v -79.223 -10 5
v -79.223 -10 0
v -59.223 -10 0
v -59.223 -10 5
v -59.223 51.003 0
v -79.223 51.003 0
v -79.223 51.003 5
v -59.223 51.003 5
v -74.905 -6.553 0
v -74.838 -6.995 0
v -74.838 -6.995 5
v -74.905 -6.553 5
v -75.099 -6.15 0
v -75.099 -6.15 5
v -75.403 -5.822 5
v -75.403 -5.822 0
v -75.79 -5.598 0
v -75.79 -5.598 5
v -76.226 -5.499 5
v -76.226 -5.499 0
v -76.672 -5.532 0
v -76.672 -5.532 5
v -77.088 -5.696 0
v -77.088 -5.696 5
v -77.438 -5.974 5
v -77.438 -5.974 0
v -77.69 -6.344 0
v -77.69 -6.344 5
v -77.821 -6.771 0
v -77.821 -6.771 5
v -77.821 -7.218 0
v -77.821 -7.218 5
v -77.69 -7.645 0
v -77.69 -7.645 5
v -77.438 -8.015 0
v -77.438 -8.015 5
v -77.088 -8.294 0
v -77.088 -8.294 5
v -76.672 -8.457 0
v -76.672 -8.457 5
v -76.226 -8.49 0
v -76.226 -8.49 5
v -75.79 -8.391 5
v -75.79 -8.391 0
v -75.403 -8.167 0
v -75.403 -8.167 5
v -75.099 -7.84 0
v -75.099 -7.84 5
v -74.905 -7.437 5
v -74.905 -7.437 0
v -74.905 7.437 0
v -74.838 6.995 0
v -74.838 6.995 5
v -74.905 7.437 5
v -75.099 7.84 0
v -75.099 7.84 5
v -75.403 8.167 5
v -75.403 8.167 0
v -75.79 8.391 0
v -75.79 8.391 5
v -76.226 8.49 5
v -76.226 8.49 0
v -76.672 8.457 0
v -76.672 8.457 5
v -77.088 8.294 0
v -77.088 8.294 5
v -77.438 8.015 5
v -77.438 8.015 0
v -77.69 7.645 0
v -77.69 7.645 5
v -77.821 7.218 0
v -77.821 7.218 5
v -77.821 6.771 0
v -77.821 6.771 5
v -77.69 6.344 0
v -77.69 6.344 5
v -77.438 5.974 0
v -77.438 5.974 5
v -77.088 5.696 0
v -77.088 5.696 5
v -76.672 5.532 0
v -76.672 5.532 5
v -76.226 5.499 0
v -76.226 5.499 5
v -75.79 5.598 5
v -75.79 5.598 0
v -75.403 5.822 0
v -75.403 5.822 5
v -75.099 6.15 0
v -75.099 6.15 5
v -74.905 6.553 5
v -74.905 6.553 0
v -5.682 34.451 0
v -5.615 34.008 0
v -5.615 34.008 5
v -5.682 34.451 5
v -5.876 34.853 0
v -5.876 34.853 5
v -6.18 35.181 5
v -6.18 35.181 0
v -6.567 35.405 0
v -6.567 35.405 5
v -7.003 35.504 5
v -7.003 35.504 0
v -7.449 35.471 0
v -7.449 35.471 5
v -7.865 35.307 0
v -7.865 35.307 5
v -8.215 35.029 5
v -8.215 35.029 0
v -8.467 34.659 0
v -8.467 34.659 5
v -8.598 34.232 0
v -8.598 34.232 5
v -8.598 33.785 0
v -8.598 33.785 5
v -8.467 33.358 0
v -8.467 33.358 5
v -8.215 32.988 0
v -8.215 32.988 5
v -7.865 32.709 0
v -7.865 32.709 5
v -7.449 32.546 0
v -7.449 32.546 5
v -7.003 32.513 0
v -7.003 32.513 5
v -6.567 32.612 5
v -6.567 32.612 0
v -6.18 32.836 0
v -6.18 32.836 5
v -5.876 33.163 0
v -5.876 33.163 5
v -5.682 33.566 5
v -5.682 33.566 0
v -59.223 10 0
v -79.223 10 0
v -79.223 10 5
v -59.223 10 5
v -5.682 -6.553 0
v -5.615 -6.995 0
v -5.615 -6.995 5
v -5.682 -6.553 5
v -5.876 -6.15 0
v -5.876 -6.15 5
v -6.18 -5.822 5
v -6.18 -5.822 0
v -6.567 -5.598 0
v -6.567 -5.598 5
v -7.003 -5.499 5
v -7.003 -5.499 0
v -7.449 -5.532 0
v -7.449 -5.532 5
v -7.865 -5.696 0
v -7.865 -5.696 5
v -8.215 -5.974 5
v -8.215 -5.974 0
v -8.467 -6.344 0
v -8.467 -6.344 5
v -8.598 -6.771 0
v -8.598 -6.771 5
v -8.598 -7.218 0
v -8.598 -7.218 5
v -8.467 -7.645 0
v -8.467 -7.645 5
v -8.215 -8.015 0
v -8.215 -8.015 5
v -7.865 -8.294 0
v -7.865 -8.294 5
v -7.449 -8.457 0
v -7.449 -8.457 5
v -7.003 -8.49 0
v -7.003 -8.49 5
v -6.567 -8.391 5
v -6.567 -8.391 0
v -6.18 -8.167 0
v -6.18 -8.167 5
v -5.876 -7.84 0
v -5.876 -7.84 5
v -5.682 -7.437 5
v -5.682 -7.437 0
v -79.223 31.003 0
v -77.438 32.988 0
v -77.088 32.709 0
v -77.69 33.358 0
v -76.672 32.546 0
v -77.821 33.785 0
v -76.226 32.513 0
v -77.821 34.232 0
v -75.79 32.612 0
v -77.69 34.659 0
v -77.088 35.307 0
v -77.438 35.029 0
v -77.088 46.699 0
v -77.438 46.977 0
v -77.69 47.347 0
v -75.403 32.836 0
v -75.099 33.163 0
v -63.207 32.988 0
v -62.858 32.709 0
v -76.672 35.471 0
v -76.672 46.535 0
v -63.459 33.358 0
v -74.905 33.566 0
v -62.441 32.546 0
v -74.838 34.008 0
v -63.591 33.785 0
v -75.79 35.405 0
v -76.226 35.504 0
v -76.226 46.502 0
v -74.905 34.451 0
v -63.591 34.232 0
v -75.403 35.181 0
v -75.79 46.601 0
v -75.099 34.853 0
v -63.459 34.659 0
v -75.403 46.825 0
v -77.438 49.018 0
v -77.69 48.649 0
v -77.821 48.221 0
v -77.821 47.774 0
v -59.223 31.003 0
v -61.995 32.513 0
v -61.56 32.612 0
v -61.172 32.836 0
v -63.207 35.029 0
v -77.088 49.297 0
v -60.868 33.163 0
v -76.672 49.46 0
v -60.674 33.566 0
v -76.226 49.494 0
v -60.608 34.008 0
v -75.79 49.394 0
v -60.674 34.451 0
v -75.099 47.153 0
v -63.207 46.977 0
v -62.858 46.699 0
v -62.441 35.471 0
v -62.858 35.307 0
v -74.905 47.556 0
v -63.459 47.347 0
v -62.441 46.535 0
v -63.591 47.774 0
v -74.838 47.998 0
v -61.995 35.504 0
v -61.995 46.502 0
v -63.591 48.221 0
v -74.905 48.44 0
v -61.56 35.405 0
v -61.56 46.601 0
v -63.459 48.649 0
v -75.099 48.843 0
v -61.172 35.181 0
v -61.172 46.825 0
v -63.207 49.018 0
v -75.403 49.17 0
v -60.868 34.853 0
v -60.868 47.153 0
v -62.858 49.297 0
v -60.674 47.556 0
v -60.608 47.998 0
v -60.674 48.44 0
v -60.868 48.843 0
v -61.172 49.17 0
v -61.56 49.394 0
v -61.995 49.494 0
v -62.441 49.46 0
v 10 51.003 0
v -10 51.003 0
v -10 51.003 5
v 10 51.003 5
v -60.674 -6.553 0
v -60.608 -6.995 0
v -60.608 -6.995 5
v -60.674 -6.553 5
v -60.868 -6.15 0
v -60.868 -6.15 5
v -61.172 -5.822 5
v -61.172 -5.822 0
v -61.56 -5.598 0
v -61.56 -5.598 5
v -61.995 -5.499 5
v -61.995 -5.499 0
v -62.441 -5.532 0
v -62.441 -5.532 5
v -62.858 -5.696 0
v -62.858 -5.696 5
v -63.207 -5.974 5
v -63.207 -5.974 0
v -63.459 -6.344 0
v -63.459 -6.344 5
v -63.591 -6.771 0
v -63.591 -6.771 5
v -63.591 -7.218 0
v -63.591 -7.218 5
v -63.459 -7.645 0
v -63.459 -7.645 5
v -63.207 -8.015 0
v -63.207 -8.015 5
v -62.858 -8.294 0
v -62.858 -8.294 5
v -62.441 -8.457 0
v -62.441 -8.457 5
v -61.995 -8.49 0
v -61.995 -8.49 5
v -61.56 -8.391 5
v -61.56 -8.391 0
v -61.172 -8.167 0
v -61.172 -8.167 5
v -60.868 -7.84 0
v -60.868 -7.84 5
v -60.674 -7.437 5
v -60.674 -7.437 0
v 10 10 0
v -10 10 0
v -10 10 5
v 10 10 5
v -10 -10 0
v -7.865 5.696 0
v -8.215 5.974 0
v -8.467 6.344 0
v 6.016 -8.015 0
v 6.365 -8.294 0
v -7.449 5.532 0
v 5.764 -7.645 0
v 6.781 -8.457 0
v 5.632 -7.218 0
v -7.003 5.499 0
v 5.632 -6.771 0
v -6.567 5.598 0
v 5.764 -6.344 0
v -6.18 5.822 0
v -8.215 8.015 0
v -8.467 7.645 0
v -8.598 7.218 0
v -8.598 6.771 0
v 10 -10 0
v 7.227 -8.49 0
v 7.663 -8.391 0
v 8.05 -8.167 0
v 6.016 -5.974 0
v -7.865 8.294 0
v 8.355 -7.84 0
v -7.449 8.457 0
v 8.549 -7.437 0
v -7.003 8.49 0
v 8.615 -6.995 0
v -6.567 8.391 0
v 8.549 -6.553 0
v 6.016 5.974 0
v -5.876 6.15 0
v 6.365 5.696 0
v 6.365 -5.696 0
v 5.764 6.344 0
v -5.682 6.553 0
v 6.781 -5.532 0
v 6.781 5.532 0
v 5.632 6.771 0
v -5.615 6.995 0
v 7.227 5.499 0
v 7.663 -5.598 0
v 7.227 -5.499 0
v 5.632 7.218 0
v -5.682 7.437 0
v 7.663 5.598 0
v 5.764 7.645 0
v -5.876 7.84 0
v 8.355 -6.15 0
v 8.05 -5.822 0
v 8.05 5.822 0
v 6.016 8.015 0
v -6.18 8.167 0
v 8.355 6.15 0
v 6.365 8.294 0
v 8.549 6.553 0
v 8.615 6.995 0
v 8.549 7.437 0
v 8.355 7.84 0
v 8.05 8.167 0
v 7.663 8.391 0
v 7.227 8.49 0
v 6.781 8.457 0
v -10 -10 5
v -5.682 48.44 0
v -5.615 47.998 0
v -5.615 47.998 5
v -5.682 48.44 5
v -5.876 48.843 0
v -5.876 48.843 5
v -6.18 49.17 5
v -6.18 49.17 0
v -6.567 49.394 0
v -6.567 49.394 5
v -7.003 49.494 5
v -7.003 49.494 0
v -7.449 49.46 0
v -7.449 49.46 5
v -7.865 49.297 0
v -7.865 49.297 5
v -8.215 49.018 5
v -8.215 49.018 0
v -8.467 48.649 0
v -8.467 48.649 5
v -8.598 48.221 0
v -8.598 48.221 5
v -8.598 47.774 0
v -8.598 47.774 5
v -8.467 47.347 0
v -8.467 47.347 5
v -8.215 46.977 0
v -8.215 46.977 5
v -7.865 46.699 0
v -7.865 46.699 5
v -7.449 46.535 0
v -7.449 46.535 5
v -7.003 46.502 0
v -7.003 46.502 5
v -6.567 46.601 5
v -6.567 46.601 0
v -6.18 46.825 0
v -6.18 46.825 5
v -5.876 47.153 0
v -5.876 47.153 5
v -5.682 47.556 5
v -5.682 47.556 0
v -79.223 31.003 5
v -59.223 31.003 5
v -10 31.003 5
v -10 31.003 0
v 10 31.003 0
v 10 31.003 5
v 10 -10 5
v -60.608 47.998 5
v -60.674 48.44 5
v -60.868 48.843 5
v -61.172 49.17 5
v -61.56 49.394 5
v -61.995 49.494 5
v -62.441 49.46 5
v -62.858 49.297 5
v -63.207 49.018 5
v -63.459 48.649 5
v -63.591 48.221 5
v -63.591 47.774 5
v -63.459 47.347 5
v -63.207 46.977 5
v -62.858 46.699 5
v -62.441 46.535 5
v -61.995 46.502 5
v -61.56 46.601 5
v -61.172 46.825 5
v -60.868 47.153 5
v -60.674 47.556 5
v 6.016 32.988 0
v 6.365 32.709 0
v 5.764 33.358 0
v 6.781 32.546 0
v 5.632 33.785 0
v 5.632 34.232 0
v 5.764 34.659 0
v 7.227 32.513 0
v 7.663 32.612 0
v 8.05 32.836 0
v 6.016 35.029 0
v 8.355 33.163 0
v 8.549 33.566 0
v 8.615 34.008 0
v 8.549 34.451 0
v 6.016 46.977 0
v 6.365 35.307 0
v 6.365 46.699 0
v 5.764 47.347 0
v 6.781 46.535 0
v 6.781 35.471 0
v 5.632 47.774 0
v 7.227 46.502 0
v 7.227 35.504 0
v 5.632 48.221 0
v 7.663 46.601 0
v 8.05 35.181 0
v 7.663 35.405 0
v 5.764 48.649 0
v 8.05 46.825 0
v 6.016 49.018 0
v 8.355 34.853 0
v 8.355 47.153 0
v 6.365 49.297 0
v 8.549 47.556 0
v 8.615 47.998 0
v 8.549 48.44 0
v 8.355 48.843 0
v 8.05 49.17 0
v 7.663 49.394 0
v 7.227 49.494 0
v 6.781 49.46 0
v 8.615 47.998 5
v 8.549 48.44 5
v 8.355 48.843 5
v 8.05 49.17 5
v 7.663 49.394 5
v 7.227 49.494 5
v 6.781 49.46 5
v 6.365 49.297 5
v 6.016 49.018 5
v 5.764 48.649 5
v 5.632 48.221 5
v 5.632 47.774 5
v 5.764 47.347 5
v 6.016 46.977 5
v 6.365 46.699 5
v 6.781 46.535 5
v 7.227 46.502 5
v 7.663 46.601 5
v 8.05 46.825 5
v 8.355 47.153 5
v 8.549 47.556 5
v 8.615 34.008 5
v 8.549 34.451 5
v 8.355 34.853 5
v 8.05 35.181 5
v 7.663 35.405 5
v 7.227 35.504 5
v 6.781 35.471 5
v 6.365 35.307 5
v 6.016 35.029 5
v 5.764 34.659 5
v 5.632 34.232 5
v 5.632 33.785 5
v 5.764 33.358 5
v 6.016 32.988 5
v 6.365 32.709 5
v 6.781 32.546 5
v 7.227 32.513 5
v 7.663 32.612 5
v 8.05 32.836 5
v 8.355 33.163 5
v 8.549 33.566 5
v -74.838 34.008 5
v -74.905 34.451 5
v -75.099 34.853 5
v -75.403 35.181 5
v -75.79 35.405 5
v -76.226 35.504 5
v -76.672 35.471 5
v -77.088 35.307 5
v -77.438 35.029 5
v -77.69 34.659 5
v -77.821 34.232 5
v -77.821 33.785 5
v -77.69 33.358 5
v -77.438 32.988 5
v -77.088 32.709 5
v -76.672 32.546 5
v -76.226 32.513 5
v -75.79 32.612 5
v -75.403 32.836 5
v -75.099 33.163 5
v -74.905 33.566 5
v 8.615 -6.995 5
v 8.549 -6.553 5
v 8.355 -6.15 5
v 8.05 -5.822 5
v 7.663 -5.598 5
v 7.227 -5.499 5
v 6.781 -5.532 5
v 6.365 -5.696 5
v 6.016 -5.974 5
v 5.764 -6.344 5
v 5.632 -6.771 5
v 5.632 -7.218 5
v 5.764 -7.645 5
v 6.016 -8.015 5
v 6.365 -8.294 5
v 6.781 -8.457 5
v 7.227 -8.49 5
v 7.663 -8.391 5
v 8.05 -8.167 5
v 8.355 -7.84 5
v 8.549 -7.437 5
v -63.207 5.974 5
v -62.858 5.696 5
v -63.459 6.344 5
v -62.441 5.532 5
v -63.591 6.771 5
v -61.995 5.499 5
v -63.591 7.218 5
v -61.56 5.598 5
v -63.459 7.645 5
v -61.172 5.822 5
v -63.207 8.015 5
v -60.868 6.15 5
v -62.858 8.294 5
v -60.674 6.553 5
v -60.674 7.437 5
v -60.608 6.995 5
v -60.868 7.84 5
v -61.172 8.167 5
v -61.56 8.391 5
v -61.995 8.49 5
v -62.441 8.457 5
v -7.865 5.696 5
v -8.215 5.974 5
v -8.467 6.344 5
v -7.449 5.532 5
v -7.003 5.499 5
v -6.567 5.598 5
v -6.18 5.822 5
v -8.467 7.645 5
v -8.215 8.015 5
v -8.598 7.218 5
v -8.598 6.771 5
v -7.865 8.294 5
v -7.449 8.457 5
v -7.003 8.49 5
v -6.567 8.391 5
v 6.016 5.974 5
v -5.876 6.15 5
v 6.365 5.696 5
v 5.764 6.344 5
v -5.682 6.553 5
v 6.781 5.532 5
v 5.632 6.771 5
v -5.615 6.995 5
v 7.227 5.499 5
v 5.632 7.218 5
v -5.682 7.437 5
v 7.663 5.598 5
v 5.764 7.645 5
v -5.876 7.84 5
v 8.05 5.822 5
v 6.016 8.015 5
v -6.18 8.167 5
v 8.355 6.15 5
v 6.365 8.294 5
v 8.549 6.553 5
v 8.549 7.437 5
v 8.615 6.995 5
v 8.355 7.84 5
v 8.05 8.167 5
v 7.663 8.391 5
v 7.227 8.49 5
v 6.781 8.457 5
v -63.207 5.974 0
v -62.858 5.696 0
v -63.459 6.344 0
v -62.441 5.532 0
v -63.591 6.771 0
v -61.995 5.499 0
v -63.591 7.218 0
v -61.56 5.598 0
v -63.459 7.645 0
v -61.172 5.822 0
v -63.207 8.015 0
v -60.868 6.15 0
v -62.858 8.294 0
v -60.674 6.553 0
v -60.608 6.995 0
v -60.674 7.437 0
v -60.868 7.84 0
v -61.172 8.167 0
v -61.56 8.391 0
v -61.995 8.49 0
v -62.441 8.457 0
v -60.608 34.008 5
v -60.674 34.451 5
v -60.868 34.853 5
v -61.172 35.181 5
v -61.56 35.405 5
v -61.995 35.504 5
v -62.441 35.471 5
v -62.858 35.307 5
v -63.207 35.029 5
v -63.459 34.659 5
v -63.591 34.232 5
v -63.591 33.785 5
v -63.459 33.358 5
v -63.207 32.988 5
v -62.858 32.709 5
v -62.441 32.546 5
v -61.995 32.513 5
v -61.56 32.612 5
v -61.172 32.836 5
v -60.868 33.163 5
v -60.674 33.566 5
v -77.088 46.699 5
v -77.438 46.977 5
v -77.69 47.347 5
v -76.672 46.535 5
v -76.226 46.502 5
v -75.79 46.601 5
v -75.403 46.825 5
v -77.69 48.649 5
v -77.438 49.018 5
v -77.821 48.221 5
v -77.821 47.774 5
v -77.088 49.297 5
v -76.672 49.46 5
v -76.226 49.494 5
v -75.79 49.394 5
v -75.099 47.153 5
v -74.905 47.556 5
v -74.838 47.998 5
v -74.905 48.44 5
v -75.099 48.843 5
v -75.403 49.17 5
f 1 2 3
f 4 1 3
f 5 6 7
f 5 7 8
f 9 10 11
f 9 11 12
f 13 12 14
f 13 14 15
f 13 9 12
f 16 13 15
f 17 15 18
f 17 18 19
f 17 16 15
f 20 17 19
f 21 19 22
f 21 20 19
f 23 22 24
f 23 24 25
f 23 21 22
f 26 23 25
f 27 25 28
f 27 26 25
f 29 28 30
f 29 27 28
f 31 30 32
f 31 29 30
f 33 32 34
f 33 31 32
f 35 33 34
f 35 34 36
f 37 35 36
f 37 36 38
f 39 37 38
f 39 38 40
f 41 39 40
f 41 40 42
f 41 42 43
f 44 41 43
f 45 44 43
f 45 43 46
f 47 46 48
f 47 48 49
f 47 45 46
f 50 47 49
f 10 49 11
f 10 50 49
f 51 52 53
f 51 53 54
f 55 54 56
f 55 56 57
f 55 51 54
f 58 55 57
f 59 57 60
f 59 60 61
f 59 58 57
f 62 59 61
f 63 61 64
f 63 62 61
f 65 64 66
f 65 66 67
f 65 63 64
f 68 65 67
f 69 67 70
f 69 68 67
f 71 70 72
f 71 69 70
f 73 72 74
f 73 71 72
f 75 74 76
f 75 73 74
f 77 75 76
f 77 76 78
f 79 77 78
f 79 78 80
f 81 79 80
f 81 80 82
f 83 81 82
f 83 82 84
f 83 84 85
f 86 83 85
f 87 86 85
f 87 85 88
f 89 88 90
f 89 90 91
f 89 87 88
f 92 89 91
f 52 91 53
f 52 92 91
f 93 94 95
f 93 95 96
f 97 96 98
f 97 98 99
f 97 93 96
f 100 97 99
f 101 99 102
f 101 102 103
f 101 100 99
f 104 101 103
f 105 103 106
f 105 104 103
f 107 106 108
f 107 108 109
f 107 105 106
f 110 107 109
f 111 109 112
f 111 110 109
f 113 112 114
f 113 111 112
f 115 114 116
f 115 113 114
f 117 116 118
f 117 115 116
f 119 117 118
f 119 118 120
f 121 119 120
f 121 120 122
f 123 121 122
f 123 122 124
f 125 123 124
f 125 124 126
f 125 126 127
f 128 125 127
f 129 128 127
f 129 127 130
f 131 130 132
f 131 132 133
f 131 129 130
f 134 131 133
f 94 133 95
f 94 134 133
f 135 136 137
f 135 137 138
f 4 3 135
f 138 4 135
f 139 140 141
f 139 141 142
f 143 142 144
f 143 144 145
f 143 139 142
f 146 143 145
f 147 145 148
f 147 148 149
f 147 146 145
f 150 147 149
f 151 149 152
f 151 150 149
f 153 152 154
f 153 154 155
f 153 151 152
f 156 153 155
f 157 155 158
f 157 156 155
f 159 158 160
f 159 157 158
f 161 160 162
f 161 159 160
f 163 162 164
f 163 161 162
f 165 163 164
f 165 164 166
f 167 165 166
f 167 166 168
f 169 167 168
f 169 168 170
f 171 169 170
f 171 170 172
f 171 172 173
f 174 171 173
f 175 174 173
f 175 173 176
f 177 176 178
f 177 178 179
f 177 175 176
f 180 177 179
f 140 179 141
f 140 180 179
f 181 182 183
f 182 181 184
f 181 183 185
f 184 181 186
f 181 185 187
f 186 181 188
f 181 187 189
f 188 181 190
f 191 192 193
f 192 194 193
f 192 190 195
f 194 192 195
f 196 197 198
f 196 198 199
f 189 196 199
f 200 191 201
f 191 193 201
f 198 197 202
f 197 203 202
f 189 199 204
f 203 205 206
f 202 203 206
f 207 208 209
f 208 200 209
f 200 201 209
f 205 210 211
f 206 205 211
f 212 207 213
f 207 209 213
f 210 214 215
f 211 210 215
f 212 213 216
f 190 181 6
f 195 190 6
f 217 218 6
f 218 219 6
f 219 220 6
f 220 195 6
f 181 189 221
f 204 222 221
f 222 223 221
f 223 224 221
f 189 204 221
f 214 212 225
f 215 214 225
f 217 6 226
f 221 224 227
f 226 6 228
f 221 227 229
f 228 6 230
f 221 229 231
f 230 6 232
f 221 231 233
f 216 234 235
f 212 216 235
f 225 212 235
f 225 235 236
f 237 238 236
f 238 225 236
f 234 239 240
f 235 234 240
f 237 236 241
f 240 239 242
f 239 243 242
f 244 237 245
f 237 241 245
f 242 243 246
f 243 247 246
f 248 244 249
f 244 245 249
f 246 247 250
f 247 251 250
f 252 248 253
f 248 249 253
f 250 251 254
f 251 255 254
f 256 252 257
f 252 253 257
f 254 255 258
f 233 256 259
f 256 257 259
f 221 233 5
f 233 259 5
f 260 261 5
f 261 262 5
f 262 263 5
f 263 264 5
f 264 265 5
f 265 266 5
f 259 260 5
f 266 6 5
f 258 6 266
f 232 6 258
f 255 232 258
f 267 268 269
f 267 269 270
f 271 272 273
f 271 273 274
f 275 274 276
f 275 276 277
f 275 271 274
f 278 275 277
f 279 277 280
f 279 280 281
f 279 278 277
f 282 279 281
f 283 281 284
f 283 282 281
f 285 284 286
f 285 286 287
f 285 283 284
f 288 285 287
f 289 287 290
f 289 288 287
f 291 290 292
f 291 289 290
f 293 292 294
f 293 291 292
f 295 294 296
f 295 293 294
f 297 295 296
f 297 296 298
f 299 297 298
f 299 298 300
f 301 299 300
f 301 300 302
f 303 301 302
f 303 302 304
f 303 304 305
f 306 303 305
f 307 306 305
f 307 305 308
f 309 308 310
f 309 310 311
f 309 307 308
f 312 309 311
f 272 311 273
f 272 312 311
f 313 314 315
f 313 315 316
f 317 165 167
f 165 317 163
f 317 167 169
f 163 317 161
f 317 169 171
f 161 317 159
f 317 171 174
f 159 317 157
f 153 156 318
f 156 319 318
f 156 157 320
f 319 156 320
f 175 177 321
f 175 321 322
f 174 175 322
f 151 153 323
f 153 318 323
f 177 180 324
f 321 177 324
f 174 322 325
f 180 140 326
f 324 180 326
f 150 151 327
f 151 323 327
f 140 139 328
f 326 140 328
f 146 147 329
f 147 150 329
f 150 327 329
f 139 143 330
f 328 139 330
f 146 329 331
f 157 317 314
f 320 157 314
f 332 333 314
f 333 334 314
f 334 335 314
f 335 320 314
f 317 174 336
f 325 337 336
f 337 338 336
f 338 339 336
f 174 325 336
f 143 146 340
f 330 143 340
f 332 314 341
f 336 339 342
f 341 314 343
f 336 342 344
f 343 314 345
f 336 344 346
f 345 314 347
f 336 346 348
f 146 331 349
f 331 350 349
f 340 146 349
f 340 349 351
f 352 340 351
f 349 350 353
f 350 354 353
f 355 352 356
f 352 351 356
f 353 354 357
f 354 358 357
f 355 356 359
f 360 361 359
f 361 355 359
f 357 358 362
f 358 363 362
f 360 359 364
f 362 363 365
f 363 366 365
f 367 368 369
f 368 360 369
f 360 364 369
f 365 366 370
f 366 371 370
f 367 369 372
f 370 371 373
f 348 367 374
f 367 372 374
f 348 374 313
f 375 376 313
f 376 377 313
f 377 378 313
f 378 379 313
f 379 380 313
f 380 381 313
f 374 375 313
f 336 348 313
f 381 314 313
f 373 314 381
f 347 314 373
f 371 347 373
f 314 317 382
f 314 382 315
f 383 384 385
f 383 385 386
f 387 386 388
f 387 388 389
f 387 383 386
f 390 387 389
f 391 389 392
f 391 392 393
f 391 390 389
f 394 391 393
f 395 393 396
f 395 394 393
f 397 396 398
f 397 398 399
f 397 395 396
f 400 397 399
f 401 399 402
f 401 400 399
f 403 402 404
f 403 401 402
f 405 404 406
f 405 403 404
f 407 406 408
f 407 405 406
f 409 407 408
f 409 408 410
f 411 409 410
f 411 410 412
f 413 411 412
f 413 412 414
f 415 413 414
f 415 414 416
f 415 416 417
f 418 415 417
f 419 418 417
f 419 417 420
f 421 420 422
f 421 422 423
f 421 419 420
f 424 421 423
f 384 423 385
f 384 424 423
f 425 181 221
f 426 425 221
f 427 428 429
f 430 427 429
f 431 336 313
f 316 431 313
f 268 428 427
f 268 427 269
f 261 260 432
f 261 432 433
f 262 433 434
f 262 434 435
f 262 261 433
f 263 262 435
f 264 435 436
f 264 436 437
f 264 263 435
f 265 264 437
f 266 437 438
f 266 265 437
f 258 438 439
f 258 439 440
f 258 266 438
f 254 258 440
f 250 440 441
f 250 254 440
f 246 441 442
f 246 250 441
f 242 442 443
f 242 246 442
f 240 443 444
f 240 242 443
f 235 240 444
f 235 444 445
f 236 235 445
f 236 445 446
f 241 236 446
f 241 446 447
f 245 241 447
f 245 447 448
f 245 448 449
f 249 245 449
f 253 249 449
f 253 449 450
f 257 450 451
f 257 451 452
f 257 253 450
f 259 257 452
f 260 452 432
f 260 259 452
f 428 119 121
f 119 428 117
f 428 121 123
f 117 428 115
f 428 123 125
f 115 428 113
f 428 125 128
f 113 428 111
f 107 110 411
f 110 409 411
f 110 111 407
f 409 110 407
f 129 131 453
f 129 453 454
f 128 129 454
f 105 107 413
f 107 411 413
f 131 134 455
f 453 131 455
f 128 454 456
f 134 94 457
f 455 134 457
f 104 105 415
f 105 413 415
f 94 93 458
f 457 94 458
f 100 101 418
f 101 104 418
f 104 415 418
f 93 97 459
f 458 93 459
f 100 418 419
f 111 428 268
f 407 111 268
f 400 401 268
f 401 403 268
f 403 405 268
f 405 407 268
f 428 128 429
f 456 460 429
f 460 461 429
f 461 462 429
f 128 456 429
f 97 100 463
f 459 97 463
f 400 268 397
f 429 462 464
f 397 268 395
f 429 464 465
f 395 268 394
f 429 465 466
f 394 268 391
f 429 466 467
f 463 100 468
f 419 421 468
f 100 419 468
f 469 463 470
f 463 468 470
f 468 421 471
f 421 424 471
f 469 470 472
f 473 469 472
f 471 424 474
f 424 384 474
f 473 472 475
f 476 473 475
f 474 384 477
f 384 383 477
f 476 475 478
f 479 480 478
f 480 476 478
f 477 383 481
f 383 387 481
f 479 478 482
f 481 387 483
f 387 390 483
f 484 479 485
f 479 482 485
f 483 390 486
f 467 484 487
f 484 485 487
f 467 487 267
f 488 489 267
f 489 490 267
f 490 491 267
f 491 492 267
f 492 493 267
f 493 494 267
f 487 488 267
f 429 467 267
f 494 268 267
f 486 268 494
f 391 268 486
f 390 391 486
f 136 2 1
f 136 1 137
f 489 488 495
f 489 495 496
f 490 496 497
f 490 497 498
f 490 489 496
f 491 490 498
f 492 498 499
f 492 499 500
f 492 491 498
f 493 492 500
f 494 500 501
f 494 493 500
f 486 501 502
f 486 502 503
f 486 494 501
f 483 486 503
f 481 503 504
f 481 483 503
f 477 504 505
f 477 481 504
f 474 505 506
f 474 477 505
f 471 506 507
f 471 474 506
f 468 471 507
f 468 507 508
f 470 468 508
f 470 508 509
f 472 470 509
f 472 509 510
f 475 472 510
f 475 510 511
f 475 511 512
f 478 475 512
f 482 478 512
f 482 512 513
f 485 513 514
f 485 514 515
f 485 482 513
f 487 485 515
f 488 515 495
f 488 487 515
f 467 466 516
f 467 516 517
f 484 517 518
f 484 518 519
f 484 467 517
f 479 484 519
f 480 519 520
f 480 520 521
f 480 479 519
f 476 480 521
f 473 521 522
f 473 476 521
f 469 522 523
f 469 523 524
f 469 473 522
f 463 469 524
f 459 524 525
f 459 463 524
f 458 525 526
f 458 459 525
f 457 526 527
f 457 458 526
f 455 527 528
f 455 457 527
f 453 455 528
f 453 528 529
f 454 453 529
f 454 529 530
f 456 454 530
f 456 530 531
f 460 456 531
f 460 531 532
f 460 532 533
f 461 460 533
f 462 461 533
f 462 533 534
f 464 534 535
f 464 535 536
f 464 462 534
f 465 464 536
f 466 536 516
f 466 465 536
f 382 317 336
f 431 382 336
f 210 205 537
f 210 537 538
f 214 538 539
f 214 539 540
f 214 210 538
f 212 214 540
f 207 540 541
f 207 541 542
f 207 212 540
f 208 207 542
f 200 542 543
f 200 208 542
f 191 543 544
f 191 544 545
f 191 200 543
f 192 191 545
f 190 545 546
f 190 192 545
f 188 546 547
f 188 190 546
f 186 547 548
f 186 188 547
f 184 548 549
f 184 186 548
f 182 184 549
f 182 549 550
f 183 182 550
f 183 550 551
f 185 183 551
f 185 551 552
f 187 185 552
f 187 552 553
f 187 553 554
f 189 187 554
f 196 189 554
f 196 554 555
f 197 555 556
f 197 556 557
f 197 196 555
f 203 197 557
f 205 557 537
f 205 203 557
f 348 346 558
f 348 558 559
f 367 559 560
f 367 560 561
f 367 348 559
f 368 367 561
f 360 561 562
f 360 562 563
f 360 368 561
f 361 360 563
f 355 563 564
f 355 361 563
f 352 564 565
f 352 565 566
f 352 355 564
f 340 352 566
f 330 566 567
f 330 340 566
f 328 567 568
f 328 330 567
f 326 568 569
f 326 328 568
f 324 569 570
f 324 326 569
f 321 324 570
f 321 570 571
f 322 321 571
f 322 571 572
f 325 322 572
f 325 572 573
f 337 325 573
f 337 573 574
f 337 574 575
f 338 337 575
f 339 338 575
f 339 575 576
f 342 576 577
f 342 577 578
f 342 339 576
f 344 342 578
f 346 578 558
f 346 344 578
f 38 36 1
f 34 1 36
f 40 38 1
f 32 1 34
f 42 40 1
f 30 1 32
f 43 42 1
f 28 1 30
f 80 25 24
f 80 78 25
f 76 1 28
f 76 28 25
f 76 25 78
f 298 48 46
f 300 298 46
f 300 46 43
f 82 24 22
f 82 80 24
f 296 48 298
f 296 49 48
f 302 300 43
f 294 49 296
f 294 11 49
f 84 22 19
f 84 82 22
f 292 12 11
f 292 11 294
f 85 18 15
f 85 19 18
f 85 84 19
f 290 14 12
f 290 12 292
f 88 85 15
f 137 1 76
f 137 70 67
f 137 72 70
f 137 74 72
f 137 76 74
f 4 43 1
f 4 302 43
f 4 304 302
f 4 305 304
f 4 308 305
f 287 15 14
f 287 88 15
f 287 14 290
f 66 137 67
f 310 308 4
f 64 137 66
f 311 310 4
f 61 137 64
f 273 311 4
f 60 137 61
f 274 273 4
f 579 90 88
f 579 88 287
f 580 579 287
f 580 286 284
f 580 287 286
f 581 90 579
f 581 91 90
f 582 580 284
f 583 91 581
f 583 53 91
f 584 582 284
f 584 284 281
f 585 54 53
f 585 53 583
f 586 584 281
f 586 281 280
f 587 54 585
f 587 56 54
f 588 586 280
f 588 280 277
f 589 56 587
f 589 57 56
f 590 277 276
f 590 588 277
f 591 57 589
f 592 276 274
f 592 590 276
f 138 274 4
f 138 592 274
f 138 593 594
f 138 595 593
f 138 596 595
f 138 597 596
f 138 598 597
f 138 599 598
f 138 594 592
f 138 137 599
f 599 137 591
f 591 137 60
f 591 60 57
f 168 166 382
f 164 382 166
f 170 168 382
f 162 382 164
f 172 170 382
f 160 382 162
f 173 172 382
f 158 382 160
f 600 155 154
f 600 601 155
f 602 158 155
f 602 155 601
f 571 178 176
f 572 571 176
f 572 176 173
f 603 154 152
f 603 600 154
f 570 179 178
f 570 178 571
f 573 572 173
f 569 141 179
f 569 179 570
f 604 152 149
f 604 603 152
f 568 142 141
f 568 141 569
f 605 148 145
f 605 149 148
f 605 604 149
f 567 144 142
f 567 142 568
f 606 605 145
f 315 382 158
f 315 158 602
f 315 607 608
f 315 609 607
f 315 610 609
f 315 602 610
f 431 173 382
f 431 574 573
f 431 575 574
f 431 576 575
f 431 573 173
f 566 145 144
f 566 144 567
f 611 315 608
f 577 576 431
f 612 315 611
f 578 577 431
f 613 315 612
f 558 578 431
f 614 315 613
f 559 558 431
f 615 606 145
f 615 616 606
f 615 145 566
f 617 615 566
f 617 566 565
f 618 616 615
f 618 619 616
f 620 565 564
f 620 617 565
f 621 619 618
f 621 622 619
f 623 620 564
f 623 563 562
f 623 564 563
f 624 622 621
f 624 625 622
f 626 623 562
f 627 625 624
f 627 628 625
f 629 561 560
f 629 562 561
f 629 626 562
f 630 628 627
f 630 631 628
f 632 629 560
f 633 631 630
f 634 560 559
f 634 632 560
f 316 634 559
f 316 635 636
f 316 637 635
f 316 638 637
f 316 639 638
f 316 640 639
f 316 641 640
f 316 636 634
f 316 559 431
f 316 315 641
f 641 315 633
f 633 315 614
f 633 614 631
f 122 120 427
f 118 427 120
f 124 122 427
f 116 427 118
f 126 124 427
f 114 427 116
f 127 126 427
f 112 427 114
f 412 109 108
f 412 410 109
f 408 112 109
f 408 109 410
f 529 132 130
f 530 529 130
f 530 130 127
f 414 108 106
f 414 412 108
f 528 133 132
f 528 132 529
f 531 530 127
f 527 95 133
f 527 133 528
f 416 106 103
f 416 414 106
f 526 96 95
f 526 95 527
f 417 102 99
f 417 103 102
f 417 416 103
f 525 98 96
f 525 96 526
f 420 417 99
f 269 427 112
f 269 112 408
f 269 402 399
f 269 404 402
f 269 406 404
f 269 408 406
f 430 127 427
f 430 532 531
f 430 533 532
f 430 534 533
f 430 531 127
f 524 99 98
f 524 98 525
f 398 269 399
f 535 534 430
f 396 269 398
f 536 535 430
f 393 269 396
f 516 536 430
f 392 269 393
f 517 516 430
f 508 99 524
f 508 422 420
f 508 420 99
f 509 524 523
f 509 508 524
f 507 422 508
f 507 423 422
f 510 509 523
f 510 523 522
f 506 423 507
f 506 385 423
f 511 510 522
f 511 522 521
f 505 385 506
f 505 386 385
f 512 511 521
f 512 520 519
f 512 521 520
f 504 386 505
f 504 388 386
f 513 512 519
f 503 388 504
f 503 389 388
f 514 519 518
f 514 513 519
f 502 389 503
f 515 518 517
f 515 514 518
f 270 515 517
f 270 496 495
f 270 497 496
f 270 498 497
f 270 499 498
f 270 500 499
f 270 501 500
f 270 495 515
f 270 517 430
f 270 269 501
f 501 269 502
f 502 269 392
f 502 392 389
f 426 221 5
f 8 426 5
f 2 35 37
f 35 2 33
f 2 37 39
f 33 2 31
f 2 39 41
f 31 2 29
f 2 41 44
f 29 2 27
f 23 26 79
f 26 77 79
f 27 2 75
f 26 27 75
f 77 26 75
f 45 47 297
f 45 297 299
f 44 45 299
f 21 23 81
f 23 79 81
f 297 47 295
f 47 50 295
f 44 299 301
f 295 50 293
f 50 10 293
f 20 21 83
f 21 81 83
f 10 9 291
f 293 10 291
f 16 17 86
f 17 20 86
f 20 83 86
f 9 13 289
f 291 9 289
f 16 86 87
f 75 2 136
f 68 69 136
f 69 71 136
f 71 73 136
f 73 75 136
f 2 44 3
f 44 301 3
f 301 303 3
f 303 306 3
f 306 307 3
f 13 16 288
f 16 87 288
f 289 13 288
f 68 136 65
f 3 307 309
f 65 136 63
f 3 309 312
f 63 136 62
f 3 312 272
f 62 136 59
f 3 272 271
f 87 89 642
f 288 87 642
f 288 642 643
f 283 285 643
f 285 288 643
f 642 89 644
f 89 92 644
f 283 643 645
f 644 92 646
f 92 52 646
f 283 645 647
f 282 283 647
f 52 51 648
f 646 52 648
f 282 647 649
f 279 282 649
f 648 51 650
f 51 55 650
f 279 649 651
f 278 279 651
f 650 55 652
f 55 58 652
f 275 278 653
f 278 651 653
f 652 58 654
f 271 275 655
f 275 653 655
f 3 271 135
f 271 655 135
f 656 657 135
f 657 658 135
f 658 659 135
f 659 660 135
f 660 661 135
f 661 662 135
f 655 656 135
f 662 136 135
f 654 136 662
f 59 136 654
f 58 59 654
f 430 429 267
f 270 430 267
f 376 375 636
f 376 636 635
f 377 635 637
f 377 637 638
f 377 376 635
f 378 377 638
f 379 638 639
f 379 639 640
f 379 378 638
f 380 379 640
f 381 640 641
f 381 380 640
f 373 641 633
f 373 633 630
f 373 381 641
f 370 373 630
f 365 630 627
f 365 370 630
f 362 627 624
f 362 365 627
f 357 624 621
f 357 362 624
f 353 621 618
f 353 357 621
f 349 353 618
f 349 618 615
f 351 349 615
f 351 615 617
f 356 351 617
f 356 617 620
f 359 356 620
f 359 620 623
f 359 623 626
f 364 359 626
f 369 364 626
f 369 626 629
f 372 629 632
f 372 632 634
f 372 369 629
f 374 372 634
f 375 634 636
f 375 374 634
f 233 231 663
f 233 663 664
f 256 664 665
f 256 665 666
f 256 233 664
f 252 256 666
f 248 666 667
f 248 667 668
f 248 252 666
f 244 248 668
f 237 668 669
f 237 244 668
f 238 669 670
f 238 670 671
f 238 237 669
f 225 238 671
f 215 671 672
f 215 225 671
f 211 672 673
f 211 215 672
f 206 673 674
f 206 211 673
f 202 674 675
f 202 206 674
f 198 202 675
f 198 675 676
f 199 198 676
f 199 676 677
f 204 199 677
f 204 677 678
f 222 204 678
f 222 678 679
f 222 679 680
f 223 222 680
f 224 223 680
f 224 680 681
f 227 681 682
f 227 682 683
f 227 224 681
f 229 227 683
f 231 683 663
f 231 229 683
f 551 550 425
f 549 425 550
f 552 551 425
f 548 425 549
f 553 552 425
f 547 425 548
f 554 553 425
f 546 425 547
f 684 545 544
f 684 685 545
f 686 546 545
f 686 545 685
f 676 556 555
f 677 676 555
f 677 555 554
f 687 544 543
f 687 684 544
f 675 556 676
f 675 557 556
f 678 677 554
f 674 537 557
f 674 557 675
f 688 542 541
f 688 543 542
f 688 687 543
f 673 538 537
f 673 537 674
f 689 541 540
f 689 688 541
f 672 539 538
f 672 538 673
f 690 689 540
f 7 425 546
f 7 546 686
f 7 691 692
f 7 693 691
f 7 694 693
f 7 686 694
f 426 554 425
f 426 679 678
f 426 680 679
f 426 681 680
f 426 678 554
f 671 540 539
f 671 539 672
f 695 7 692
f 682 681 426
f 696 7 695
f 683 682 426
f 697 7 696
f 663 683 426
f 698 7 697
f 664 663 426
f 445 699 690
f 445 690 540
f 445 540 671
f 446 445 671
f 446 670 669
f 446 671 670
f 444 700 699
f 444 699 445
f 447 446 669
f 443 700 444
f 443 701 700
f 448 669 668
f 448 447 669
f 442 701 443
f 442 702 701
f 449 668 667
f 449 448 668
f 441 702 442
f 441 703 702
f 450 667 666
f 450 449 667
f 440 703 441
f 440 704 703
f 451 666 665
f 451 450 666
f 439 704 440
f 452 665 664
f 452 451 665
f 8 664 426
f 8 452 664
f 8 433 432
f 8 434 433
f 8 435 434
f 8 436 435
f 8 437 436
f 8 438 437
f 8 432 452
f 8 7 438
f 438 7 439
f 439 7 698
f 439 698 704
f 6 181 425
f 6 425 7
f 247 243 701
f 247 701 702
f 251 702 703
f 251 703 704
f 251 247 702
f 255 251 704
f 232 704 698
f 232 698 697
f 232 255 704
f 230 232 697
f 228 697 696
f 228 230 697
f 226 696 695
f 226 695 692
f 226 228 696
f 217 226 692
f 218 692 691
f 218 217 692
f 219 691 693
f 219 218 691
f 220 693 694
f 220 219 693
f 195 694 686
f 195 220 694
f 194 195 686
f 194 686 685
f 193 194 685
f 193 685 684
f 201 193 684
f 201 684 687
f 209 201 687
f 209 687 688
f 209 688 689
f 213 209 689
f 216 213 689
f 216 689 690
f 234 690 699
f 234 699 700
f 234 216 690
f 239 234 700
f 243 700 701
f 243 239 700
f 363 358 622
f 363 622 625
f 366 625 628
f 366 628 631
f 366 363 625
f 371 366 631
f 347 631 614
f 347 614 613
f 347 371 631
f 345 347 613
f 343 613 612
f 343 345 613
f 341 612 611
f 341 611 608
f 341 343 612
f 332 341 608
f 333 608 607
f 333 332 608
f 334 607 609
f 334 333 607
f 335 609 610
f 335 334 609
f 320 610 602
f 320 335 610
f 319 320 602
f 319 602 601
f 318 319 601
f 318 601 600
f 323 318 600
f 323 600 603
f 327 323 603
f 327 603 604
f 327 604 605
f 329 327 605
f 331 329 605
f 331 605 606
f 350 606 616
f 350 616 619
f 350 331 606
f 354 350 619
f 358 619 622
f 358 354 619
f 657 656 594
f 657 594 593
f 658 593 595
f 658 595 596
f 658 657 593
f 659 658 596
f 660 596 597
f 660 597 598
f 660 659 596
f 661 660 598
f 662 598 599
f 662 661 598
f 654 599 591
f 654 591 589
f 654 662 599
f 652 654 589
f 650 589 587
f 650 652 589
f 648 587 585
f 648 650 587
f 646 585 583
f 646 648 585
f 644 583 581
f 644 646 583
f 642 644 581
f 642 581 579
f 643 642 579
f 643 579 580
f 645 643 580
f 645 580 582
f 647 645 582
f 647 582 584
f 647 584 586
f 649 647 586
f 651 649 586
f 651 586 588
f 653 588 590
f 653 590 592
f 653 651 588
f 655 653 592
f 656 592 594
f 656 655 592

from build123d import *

# Parameters (mm, degrees)
F0_W     = 20
F0_H     = 20
F0_R     = 1.5
F1_DEPTH = 5
F2_DEPTH = 5
F3_DEPTH = 5


with BuildPart() as f1:
    # F0 (on Top) → F1 (new body)
    with BuildSketch(Plane.XY):
        with Locations((0, 41.003063)):
            Rectangle(F0_W, F0_H)
        with Locations((-7.115238, 34.008425)):
            Circle(F0_R, mode=Mode.SUBTRACT)
        with Locations((7.115238, 34.008425)):
            Circle(F0_R, mode=Mode.SUBTRACT)
        with Locations((-7.115238, 47.997702)):
            Circle(F0_R, mode=Mode.SUBTRACT)
        with Locations((7.115238, 47.997702)):
            Circle(F0_R, mode=Mode.SUBTRACT)
    extrude(amount=F1_DEPTH)


with BuildPart() as f2:
    # F0 (on Top) → F2 (new body)
    with BuildSketch(Plane.XY):
        Rectangle(F0_W, F0_H)
        with Locations((-7.115238, -6.994639)):
            Circle(F0_R, mode=Mode.SUBTRACT)
        with Locations((7.115238, -6.994639)):
            Circle(F0_R, mode=Mode.SUBTRACT)
        with Locations((-7.115238, 6.994639)):
            Circle(F0_R, mode=Mode.SUBTRACT)
        with Locations((7.115238, 6.994639)):
            Circle(F0_R, mode=Mode.SUBTRACT)
    extrude(amount=F2_DEPTH)


with BuildPart() as f3:
    # F0 (on Top) → F3 (new body)
    with BuildSketch(Plane.XY):
        with Locations((-69.222823, 41.003063)):
            Rectangle(F0_W, F0_H)
        with Locations((-76.338061, 34.008425)):
            Circle(F0_R, mode=Mode.SUBTRACT)
        with Locations((-62.107585, 34.008425)):
            Circle(F0_R, mode=Mode.SUBTRACT)
        with Locations((-76.338061, 47.997702)):
            Circle(F0_R, mode=Mode.SUBTRACT)
        with Locations((-62.107585, 47.997702)):
            Circle(F0_R, mode=Mode.SUBTRACT)
        with Locations((-69.222823, 0)):
            Rectangle(F0_W, F0_H)
        with Locations((-76.338061, -6.994639)):
            Circle(F0_R, mode=Mode.SUBTRACT)
        with Locations((-62.107585, -6.994639)):
            Circle(F0_R, mode=Mode.SUBTRACT)
        with Locations((-76.338061, 6.994639)):
            Circle(F0_R, mode=Mode.SUBTRACT)
        with Locations((-62.107585, 6.994639)):
            Circle(F0_R, mode=Mode.SUBTRACT)
    extrude(amount=F3_DEPTH)


solid = Compound([f1.part, f2.part, f3.part])
